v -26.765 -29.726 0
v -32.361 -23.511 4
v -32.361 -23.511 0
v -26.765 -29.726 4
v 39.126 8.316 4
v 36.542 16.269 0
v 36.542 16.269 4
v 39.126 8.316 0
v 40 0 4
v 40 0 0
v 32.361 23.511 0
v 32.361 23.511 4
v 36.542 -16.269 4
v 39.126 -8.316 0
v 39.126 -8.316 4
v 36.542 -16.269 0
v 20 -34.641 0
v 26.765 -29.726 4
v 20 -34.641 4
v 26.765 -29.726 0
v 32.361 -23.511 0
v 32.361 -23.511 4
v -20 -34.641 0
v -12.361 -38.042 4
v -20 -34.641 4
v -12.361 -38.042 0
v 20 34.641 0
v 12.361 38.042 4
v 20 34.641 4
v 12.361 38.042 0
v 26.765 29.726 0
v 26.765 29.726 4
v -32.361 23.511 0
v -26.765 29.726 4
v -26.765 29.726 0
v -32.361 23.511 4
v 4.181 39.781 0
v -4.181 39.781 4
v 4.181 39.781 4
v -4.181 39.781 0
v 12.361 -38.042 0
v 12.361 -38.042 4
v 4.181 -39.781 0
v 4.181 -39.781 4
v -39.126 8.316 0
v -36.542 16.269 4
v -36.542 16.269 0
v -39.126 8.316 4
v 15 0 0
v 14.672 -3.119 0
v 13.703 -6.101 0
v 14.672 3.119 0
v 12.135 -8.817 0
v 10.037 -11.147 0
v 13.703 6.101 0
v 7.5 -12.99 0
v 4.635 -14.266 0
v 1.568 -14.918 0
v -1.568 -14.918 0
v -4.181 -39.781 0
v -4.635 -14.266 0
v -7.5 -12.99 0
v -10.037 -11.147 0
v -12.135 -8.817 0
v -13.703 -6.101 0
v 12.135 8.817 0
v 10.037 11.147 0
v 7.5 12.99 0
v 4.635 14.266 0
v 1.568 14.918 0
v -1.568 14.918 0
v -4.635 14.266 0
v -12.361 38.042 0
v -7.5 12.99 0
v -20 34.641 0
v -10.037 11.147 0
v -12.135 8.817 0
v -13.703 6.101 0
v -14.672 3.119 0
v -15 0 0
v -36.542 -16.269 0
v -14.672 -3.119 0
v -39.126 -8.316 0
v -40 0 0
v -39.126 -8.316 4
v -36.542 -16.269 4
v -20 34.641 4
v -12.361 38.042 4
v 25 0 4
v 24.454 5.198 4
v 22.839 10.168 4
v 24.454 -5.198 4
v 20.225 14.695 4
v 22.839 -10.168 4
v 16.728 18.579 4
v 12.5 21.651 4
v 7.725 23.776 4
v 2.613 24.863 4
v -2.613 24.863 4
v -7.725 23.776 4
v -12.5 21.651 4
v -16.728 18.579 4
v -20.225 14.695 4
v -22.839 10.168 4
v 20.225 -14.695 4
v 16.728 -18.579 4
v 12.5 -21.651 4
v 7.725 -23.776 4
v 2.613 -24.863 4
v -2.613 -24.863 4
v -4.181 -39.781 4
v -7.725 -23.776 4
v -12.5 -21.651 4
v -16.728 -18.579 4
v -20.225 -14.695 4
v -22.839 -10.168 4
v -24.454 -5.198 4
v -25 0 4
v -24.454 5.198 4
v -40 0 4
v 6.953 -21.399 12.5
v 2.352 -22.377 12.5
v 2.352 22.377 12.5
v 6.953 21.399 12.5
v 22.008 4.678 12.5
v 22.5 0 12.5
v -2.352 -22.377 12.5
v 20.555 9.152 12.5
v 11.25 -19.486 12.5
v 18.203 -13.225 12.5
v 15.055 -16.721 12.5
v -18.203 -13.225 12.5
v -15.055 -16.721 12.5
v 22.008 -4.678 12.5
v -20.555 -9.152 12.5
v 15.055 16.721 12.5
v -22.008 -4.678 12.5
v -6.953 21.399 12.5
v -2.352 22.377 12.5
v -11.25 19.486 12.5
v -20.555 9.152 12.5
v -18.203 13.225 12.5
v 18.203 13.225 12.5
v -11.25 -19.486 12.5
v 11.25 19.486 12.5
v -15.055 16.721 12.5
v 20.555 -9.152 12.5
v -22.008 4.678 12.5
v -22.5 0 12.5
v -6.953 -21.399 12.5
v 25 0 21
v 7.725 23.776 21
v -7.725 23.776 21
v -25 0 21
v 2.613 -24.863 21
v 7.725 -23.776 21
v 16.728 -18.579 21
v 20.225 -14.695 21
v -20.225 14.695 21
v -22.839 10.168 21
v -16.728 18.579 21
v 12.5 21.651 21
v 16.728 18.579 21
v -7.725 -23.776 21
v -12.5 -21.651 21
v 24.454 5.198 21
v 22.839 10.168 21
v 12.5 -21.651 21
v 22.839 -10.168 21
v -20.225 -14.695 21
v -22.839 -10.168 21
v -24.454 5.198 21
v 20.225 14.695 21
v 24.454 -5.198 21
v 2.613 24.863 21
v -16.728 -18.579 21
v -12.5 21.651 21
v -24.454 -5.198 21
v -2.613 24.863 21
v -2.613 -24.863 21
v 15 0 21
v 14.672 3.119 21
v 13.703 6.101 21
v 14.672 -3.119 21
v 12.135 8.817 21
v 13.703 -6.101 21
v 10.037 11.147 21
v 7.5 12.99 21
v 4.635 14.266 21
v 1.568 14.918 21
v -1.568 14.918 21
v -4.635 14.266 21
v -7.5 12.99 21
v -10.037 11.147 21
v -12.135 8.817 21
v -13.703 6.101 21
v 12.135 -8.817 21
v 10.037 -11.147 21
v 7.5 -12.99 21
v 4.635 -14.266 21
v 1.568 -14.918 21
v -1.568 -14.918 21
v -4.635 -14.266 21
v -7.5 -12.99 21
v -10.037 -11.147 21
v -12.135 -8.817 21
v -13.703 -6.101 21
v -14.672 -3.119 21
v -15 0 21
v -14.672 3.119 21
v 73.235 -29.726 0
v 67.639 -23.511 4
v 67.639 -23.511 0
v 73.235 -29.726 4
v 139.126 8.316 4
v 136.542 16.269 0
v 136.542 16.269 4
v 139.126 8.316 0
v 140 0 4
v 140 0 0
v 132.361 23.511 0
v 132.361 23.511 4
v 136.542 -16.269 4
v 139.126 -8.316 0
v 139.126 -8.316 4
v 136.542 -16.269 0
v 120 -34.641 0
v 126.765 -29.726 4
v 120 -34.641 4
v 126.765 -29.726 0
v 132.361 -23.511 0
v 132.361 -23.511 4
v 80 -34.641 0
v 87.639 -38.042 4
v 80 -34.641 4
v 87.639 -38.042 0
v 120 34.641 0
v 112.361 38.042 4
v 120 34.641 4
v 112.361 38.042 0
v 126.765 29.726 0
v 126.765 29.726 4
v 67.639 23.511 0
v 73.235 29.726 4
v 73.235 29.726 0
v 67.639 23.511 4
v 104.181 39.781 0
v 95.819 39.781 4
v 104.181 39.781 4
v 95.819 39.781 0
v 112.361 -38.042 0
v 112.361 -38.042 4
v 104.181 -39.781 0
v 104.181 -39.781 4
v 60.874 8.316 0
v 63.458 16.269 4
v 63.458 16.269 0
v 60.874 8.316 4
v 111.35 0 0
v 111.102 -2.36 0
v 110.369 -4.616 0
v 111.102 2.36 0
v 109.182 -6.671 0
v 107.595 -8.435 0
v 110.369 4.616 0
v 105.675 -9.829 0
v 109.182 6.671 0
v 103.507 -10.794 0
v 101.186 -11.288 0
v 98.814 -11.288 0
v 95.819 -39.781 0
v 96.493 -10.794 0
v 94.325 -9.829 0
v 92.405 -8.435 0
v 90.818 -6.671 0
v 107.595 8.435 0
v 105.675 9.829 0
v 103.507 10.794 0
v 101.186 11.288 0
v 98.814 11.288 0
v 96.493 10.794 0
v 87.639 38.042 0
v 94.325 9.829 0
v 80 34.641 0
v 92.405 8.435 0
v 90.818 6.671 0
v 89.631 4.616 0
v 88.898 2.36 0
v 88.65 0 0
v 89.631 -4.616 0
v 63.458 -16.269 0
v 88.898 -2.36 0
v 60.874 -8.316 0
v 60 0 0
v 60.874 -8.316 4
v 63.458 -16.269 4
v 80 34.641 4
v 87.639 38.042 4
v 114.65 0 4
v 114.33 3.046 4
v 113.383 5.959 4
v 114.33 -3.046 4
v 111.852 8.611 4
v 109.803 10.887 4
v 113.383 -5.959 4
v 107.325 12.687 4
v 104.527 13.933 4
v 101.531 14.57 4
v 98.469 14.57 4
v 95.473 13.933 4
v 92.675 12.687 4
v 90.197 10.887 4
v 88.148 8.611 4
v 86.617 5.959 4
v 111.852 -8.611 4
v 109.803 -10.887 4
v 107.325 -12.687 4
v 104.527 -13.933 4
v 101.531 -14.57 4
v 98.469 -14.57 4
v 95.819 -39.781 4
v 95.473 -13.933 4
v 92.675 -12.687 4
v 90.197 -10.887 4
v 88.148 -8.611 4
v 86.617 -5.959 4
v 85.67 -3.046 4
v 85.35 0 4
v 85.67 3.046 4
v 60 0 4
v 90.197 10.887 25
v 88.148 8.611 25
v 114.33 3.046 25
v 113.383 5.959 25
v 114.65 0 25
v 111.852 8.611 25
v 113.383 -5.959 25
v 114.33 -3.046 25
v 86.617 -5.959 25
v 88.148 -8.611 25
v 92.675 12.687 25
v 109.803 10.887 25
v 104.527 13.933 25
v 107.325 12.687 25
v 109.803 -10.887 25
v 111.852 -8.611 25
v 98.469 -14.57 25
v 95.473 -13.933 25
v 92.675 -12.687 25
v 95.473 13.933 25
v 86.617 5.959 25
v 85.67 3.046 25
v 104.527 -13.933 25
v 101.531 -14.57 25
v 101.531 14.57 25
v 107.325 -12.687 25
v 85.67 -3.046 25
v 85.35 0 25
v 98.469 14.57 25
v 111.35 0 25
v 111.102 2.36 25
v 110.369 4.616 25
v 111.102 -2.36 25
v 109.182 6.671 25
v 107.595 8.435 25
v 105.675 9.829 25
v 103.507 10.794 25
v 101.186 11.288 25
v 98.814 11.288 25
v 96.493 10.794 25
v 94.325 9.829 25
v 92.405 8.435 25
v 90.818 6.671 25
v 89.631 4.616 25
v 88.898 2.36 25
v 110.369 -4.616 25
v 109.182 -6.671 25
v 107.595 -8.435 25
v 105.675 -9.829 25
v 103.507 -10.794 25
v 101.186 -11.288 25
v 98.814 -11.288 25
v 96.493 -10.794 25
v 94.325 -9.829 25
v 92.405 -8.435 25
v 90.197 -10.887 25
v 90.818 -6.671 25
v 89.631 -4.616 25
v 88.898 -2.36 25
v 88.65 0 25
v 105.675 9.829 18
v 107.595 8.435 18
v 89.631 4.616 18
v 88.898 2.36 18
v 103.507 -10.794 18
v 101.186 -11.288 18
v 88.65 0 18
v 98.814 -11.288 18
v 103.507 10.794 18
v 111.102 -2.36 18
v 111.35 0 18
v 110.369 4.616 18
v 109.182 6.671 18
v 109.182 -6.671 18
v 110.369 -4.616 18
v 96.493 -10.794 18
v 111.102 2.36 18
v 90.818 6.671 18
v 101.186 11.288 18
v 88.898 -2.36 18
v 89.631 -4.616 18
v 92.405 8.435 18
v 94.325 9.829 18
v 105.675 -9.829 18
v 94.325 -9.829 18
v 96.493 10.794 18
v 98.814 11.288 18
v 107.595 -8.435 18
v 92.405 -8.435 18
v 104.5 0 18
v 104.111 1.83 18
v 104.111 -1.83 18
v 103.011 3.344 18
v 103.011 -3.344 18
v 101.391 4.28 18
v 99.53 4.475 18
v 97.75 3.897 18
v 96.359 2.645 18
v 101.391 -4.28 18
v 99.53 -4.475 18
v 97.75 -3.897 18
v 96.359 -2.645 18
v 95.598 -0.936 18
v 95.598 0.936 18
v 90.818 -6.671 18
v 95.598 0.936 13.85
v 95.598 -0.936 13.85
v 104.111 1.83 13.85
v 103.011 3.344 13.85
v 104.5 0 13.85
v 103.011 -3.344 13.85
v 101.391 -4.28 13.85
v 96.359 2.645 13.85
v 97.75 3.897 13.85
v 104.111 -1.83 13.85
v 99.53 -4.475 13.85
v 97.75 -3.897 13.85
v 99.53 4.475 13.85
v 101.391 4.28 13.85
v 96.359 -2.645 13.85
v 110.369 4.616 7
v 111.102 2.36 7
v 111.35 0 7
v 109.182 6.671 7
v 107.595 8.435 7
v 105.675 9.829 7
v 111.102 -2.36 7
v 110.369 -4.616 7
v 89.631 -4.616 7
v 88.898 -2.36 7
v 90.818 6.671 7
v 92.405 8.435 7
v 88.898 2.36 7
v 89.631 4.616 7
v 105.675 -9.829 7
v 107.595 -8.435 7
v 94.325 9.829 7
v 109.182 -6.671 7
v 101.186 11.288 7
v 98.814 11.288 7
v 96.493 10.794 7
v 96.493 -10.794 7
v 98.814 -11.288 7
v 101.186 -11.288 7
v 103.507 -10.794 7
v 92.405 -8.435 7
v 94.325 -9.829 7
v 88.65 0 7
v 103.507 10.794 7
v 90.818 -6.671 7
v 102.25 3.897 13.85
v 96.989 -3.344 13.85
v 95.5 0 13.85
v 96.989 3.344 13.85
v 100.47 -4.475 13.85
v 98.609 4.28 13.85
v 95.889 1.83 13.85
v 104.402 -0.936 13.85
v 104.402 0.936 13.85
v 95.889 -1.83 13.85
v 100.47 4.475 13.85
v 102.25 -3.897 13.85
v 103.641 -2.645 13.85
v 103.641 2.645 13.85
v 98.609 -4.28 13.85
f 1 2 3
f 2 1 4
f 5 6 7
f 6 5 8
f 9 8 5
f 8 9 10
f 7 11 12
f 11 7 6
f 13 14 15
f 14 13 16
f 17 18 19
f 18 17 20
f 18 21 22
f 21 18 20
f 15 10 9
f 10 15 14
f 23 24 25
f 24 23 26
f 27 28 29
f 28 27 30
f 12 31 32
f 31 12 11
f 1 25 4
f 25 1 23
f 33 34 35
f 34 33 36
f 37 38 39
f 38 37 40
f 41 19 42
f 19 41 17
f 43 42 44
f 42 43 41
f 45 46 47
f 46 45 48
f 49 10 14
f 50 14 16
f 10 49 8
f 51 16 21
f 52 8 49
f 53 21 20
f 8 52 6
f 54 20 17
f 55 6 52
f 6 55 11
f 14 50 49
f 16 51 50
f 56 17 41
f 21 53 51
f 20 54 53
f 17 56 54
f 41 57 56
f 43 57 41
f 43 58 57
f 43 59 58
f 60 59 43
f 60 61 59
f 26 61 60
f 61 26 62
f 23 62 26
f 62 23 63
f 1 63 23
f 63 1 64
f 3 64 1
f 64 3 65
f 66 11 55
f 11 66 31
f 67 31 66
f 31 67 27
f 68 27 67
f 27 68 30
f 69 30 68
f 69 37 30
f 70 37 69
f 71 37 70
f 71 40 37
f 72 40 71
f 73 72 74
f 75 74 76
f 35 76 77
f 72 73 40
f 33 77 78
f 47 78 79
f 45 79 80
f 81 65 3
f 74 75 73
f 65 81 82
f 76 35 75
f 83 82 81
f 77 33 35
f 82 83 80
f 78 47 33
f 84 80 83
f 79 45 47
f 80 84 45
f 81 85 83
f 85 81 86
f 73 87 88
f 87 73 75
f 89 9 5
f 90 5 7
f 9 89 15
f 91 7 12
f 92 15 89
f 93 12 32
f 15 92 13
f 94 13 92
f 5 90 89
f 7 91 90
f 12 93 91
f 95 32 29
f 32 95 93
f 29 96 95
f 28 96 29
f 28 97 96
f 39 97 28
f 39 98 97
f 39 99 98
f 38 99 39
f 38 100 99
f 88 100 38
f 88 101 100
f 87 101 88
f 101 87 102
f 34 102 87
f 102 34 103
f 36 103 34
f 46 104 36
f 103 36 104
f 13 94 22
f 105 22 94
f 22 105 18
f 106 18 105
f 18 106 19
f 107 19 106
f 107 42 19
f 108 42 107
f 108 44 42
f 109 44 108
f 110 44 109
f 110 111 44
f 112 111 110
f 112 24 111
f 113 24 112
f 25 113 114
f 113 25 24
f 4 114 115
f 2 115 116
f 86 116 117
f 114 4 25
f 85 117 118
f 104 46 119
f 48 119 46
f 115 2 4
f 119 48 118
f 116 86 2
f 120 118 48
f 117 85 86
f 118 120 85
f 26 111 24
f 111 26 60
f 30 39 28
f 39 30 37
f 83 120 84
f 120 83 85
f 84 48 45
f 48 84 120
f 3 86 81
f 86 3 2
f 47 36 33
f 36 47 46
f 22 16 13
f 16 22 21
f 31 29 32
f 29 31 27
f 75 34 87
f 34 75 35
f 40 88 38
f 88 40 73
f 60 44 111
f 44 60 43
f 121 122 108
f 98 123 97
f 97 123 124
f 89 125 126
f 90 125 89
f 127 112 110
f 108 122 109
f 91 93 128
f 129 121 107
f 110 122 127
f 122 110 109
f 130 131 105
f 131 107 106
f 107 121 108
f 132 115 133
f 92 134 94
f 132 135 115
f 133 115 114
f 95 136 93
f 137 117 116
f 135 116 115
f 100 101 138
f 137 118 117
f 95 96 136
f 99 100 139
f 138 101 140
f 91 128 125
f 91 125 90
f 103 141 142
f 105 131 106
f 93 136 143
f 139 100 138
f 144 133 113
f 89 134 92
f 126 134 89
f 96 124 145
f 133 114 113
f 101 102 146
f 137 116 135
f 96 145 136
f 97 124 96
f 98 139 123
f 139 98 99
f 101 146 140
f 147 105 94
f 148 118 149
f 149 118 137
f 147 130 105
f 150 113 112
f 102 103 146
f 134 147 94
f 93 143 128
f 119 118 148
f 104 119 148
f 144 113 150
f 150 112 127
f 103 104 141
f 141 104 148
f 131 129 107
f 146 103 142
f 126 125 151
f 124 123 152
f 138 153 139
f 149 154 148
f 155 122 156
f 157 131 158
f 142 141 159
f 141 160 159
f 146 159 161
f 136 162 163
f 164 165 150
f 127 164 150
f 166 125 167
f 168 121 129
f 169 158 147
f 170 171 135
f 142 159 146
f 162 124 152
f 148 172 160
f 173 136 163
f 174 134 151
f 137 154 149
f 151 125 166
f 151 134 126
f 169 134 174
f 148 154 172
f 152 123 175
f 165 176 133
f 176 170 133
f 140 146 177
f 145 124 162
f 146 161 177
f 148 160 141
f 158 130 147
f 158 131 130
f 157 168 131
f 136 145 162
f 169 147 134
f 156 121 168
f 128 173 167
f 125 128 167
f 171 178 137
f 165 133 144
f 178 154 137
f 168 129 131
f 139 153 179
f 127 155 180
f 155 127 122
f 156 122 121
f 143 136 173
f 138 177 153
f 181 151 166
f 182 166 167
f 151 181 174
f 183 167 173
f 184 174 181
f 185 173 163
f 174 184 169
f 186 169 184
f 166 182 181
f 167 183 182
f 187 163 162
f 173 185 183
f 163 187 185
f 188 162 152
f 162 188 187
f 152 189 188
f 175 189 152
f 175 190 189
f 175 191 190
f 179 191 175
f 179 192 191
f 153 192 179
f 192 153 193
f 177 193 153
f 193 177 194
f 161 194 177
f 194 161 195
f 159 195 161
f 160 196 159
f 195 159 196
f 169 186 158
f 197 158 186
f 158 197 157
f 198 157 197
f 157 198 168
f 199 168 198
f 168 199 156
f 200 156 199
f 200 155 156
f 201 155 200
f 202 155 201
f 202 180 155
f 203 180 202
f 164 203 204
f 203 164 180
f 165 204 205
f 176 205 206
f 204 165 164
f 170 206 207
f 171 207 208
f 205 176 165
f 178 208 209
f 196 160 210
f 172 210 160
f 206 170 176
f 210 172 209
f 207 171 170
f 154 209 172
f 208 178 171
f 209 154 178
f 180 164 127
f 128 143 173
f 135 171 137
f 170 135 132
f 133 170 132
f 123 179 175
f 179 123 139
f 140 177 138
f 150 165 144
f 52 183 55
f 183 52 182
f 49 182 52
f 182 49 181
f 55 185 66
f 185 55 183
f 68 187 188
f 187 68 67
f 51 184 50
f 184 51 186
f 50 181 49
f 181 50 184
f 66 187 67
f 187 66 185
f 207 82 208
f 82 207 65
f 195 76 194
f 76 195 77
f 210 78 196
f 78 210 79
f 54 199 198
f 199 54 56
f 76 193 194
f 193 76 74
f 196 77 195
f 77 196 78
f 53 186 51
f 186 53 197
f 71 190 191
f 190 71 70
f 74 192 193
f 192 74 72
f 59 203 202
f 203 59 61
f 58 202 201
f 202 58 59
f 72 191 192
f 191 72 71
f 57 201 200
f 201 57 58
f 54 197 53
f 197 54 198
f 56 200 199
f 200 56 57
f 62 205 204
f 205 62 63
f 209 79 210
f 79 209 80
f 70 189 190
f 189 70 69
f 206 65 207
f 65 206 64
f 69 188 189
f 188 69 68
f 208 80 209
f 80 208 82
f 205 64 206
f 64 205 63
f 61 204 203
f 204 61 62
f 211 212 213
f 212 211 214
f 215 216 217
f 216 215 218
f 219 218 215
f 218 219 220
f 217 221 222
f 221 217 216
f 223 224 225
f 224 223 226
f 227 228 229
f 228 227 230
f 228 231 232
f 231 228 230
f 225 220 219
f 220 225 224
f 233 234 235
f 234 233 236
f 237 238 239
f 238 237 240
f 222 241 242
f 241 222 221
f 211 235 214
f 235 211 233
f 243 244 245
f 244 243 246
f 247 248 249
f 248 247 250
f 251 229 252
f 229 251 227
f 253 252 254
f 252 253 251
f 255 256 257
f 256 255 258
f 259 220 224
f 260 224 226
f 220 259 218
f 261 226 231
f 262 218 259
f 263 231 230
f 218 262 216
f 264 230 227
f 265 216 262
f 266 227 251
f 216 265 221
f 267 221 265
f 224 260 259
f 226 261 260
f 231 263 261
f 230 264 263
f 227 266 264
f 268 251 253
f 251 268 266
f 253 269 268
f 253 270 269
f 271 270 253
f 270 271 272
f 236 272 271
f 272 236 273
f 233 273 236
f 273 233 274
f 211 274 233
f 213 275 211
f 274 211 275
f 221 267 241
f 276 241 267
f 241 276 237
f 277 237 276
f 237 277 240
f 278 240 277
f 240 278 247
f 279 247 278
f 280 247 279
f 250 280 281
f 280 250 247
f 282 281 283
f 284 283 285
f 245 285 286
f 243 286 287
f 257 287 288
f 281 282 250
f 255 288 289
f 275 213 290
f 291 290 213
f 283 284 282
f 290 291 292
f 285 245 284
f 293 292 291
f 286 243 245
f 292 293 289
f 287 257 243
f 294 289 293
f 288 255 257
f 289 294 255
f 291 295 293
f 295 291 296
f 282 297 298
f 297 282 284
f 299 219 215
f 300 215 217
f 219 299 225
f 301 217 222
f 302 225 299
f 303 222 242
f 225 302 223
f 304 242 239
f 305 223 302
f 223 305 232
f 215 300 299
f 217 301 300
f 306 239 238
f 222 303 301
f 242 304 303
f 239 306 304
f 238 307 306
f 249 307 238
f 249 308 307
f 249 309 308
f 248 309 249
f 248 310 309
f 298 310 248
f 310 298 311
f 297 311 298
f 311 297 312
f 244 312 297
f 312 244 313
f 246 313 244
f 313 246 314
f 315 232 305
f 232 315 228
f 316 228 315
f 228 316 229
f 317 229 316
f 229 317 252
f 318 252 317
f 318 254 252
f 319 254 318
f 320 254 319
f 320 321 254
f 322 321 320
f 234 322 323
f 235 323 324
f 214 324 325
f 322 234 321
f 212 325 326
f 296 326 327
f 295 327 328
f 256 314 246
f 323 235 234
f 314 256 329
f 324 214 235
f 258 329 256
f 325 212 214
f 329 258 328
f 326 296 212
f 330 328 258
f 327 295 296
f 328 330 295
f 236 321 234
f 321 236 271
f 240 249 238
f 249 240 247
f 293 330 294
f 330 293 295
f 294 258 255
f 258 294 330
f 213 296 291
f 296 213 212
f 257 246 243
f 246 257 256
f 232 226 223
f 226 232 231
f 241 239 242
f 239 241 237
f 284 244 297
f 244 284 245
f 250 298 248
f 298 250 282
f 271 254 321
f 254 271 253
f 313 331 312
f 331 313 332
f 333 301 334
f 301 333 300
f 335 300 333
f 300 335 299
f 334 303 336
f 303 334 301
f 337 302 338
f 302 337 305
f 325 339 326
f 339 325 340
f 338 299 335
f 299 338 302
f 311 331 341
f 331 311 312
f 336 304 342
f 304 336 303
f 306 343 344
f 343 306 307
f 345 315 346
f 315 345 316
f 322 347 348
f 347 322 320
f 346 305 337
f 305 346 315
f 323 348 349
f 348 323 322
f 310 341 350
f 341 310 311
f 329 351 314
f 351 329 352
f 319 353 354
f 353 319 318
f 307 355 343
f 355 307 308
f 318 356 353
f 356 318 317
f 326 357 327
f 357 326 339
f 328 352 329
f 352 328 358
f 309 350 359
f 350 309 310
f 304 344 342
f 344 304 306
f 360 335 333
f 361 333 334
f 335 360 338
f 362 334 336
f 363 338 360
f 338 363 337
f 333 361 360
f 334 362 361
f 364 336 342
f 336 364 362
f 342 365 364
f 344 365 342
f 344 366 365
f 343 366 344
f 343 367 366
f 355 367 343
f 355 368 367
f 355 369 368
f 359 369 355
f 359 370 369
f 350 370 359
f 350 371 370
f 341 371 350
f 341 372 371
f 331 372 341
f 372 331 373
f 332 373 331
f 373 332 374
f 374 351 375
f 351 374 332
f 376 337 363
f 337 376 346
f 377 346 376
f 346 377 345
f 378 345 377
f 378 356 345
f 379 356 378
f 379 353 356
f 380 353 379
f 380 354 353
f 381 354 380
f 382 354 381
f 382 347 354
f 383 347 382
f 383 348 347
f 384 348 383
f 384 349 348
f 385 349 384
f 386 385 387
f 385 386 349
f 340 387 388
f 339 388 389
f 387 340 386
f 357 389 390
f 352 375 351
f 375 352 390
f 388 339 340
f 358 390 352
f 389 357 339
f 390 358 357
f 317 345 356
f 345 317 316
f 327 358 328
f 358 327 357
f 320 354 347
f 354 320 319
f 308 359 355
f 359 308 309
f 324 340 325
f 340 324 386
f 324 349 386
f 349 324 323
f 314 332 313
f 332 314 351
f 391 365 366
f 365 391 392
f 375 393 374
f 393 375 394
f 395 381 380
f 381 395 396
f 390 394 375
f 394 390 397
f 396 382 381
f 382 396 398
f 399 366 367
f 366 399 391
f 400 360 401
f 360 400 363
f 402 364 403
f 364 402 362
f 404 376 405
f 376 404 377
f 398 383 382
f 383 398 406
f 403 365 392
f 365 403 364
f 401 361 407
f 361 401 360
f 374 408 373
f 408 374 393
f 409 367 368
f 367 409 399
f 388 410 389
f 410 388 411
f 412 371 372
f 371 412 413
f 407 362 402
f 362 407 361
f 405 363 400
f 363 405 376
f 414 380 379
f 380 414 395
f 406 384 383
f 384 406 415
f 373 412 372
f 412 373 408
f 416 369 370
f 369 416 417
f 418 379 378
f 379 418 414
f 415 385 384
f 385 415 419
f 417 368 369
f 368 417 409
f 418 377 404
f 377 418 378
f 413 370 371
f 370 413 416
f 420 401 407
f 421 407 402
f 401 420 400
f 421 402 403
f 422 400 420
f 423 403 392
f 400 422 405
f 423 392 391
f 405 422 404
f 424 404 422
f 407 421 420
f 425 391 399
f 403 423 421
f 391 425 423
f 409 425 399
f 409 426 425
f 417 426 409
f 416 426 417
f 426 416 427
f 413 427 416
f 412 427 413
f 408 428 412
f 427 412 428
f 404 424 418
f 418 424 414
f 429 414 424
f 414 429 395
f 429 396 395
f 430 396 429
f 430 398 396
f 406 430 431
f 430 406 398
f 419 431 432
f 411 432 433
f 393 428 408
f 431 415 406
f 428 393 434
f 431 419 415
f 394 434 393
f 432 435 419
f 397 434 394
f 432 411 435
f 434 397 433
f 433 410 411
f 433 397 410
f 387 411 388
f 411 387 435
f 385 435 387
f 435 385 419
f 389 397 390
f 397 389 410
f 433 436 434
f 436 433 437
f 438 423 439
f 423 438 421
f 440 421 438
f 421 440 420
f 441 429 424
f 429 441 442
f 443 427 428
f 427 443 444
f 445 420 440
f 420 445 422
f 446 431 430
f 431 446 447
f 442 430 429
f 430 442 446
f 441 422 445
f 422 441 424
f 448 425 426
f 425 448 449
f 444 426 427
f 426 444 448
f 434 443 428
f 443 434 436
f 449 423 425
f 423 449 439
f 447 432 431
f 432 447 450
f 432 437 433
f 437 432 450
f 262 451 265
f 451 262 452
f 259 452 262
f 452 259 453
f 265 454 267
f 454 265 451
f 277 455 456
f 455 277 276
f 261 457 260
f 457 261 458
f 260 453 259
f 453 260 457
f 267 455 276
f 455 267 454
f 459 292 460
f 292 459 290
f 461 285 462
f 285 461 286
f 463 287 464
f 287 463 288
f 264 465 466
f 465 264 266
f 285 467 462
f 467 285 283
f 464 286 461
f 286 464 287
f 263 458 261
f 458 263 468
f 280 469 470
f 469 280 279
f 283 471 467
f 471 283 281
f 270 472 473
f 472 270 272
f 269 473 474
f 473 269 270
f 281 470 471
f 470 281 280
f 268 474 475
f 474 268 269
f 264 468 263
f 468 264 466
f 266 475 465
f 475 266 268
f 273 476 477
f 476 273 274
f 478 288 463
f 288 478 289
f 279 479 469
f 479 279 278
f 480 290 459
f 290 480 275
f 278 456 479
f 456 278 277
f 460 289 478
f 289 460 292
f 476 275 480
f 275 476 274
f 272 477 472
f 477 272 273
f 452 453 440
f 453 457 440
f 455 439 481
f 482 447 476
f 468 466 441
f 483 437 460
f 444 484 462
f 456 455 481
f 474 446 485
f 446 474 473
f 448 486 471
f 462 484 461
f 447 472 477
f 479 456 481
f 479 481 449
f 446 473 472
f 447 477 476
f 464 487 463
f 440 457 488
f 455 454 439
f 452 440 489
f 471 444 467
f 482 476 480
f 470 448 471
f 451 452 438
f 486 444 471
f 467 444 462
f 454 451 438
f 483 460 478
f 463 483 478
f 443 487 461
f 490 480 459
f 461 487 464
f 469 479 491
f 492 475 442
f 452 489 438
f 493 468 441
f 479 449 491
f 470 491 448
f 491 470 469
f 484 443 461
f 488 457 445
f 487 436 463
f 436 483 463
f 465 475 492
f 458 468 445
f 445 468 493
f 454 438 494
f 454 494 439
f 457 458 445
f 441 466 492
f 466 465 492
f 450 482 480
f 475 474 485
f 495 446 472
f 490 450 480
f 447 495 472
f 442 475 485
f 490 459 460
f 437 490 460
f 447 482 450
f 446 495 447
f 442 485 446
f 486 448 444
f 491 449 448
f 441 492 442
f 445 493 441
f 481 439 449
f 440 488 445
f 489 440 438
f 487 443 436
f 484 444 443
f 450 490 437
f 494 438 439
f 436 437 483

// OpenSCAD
//pulley outer diameter
pod = 80;

//pulley thickness
pth = 25;

//pulley hole diameter
phd = 22;

//pulley lid wall thickness
plwth = 4;

//pulley flange height
pfh = 4;

//pulley inner diameter 1
pid1 = 50;

//pulley inner diameter 2
pid2 = 45;

//pulley inner diameter height
pidh = (pth-pfh*2);

//pulley rod diameter
prd = 9;

//bearing height
bh = 7;



//give
g = .7;


difference()
{
union()
{
cylinder(d=pod,h=pfh);
translate([0,0,pfh])
cylinder(d1=pid1, d2=pid2, h=pidh/2);
translate([0,0,pfh+pidh/2])
cylinder(d2=pid1, d1=pid2, h=pidh/2);
}

cylinder(d=phd+plwth*2, h=pth);
}



translate([100,0,0])
{
difference()
{
union()
{
cylinder(d=pod,h=pfh);
translate([0,0,pfh])
cylinder(d=phd+plwth*2-g, h=pth-pfh);
}

translate([0,0,pth-bh])
cylinder(d=phd+g, h=pth);

cylinder(d=prd, h=pth+1);

cylinder(d=phd+g, h=bh);

translate([0,0,bh])
cylinder(d1=phd+g, d2=prd, h=(phd+g-prd)/2);

}




}
